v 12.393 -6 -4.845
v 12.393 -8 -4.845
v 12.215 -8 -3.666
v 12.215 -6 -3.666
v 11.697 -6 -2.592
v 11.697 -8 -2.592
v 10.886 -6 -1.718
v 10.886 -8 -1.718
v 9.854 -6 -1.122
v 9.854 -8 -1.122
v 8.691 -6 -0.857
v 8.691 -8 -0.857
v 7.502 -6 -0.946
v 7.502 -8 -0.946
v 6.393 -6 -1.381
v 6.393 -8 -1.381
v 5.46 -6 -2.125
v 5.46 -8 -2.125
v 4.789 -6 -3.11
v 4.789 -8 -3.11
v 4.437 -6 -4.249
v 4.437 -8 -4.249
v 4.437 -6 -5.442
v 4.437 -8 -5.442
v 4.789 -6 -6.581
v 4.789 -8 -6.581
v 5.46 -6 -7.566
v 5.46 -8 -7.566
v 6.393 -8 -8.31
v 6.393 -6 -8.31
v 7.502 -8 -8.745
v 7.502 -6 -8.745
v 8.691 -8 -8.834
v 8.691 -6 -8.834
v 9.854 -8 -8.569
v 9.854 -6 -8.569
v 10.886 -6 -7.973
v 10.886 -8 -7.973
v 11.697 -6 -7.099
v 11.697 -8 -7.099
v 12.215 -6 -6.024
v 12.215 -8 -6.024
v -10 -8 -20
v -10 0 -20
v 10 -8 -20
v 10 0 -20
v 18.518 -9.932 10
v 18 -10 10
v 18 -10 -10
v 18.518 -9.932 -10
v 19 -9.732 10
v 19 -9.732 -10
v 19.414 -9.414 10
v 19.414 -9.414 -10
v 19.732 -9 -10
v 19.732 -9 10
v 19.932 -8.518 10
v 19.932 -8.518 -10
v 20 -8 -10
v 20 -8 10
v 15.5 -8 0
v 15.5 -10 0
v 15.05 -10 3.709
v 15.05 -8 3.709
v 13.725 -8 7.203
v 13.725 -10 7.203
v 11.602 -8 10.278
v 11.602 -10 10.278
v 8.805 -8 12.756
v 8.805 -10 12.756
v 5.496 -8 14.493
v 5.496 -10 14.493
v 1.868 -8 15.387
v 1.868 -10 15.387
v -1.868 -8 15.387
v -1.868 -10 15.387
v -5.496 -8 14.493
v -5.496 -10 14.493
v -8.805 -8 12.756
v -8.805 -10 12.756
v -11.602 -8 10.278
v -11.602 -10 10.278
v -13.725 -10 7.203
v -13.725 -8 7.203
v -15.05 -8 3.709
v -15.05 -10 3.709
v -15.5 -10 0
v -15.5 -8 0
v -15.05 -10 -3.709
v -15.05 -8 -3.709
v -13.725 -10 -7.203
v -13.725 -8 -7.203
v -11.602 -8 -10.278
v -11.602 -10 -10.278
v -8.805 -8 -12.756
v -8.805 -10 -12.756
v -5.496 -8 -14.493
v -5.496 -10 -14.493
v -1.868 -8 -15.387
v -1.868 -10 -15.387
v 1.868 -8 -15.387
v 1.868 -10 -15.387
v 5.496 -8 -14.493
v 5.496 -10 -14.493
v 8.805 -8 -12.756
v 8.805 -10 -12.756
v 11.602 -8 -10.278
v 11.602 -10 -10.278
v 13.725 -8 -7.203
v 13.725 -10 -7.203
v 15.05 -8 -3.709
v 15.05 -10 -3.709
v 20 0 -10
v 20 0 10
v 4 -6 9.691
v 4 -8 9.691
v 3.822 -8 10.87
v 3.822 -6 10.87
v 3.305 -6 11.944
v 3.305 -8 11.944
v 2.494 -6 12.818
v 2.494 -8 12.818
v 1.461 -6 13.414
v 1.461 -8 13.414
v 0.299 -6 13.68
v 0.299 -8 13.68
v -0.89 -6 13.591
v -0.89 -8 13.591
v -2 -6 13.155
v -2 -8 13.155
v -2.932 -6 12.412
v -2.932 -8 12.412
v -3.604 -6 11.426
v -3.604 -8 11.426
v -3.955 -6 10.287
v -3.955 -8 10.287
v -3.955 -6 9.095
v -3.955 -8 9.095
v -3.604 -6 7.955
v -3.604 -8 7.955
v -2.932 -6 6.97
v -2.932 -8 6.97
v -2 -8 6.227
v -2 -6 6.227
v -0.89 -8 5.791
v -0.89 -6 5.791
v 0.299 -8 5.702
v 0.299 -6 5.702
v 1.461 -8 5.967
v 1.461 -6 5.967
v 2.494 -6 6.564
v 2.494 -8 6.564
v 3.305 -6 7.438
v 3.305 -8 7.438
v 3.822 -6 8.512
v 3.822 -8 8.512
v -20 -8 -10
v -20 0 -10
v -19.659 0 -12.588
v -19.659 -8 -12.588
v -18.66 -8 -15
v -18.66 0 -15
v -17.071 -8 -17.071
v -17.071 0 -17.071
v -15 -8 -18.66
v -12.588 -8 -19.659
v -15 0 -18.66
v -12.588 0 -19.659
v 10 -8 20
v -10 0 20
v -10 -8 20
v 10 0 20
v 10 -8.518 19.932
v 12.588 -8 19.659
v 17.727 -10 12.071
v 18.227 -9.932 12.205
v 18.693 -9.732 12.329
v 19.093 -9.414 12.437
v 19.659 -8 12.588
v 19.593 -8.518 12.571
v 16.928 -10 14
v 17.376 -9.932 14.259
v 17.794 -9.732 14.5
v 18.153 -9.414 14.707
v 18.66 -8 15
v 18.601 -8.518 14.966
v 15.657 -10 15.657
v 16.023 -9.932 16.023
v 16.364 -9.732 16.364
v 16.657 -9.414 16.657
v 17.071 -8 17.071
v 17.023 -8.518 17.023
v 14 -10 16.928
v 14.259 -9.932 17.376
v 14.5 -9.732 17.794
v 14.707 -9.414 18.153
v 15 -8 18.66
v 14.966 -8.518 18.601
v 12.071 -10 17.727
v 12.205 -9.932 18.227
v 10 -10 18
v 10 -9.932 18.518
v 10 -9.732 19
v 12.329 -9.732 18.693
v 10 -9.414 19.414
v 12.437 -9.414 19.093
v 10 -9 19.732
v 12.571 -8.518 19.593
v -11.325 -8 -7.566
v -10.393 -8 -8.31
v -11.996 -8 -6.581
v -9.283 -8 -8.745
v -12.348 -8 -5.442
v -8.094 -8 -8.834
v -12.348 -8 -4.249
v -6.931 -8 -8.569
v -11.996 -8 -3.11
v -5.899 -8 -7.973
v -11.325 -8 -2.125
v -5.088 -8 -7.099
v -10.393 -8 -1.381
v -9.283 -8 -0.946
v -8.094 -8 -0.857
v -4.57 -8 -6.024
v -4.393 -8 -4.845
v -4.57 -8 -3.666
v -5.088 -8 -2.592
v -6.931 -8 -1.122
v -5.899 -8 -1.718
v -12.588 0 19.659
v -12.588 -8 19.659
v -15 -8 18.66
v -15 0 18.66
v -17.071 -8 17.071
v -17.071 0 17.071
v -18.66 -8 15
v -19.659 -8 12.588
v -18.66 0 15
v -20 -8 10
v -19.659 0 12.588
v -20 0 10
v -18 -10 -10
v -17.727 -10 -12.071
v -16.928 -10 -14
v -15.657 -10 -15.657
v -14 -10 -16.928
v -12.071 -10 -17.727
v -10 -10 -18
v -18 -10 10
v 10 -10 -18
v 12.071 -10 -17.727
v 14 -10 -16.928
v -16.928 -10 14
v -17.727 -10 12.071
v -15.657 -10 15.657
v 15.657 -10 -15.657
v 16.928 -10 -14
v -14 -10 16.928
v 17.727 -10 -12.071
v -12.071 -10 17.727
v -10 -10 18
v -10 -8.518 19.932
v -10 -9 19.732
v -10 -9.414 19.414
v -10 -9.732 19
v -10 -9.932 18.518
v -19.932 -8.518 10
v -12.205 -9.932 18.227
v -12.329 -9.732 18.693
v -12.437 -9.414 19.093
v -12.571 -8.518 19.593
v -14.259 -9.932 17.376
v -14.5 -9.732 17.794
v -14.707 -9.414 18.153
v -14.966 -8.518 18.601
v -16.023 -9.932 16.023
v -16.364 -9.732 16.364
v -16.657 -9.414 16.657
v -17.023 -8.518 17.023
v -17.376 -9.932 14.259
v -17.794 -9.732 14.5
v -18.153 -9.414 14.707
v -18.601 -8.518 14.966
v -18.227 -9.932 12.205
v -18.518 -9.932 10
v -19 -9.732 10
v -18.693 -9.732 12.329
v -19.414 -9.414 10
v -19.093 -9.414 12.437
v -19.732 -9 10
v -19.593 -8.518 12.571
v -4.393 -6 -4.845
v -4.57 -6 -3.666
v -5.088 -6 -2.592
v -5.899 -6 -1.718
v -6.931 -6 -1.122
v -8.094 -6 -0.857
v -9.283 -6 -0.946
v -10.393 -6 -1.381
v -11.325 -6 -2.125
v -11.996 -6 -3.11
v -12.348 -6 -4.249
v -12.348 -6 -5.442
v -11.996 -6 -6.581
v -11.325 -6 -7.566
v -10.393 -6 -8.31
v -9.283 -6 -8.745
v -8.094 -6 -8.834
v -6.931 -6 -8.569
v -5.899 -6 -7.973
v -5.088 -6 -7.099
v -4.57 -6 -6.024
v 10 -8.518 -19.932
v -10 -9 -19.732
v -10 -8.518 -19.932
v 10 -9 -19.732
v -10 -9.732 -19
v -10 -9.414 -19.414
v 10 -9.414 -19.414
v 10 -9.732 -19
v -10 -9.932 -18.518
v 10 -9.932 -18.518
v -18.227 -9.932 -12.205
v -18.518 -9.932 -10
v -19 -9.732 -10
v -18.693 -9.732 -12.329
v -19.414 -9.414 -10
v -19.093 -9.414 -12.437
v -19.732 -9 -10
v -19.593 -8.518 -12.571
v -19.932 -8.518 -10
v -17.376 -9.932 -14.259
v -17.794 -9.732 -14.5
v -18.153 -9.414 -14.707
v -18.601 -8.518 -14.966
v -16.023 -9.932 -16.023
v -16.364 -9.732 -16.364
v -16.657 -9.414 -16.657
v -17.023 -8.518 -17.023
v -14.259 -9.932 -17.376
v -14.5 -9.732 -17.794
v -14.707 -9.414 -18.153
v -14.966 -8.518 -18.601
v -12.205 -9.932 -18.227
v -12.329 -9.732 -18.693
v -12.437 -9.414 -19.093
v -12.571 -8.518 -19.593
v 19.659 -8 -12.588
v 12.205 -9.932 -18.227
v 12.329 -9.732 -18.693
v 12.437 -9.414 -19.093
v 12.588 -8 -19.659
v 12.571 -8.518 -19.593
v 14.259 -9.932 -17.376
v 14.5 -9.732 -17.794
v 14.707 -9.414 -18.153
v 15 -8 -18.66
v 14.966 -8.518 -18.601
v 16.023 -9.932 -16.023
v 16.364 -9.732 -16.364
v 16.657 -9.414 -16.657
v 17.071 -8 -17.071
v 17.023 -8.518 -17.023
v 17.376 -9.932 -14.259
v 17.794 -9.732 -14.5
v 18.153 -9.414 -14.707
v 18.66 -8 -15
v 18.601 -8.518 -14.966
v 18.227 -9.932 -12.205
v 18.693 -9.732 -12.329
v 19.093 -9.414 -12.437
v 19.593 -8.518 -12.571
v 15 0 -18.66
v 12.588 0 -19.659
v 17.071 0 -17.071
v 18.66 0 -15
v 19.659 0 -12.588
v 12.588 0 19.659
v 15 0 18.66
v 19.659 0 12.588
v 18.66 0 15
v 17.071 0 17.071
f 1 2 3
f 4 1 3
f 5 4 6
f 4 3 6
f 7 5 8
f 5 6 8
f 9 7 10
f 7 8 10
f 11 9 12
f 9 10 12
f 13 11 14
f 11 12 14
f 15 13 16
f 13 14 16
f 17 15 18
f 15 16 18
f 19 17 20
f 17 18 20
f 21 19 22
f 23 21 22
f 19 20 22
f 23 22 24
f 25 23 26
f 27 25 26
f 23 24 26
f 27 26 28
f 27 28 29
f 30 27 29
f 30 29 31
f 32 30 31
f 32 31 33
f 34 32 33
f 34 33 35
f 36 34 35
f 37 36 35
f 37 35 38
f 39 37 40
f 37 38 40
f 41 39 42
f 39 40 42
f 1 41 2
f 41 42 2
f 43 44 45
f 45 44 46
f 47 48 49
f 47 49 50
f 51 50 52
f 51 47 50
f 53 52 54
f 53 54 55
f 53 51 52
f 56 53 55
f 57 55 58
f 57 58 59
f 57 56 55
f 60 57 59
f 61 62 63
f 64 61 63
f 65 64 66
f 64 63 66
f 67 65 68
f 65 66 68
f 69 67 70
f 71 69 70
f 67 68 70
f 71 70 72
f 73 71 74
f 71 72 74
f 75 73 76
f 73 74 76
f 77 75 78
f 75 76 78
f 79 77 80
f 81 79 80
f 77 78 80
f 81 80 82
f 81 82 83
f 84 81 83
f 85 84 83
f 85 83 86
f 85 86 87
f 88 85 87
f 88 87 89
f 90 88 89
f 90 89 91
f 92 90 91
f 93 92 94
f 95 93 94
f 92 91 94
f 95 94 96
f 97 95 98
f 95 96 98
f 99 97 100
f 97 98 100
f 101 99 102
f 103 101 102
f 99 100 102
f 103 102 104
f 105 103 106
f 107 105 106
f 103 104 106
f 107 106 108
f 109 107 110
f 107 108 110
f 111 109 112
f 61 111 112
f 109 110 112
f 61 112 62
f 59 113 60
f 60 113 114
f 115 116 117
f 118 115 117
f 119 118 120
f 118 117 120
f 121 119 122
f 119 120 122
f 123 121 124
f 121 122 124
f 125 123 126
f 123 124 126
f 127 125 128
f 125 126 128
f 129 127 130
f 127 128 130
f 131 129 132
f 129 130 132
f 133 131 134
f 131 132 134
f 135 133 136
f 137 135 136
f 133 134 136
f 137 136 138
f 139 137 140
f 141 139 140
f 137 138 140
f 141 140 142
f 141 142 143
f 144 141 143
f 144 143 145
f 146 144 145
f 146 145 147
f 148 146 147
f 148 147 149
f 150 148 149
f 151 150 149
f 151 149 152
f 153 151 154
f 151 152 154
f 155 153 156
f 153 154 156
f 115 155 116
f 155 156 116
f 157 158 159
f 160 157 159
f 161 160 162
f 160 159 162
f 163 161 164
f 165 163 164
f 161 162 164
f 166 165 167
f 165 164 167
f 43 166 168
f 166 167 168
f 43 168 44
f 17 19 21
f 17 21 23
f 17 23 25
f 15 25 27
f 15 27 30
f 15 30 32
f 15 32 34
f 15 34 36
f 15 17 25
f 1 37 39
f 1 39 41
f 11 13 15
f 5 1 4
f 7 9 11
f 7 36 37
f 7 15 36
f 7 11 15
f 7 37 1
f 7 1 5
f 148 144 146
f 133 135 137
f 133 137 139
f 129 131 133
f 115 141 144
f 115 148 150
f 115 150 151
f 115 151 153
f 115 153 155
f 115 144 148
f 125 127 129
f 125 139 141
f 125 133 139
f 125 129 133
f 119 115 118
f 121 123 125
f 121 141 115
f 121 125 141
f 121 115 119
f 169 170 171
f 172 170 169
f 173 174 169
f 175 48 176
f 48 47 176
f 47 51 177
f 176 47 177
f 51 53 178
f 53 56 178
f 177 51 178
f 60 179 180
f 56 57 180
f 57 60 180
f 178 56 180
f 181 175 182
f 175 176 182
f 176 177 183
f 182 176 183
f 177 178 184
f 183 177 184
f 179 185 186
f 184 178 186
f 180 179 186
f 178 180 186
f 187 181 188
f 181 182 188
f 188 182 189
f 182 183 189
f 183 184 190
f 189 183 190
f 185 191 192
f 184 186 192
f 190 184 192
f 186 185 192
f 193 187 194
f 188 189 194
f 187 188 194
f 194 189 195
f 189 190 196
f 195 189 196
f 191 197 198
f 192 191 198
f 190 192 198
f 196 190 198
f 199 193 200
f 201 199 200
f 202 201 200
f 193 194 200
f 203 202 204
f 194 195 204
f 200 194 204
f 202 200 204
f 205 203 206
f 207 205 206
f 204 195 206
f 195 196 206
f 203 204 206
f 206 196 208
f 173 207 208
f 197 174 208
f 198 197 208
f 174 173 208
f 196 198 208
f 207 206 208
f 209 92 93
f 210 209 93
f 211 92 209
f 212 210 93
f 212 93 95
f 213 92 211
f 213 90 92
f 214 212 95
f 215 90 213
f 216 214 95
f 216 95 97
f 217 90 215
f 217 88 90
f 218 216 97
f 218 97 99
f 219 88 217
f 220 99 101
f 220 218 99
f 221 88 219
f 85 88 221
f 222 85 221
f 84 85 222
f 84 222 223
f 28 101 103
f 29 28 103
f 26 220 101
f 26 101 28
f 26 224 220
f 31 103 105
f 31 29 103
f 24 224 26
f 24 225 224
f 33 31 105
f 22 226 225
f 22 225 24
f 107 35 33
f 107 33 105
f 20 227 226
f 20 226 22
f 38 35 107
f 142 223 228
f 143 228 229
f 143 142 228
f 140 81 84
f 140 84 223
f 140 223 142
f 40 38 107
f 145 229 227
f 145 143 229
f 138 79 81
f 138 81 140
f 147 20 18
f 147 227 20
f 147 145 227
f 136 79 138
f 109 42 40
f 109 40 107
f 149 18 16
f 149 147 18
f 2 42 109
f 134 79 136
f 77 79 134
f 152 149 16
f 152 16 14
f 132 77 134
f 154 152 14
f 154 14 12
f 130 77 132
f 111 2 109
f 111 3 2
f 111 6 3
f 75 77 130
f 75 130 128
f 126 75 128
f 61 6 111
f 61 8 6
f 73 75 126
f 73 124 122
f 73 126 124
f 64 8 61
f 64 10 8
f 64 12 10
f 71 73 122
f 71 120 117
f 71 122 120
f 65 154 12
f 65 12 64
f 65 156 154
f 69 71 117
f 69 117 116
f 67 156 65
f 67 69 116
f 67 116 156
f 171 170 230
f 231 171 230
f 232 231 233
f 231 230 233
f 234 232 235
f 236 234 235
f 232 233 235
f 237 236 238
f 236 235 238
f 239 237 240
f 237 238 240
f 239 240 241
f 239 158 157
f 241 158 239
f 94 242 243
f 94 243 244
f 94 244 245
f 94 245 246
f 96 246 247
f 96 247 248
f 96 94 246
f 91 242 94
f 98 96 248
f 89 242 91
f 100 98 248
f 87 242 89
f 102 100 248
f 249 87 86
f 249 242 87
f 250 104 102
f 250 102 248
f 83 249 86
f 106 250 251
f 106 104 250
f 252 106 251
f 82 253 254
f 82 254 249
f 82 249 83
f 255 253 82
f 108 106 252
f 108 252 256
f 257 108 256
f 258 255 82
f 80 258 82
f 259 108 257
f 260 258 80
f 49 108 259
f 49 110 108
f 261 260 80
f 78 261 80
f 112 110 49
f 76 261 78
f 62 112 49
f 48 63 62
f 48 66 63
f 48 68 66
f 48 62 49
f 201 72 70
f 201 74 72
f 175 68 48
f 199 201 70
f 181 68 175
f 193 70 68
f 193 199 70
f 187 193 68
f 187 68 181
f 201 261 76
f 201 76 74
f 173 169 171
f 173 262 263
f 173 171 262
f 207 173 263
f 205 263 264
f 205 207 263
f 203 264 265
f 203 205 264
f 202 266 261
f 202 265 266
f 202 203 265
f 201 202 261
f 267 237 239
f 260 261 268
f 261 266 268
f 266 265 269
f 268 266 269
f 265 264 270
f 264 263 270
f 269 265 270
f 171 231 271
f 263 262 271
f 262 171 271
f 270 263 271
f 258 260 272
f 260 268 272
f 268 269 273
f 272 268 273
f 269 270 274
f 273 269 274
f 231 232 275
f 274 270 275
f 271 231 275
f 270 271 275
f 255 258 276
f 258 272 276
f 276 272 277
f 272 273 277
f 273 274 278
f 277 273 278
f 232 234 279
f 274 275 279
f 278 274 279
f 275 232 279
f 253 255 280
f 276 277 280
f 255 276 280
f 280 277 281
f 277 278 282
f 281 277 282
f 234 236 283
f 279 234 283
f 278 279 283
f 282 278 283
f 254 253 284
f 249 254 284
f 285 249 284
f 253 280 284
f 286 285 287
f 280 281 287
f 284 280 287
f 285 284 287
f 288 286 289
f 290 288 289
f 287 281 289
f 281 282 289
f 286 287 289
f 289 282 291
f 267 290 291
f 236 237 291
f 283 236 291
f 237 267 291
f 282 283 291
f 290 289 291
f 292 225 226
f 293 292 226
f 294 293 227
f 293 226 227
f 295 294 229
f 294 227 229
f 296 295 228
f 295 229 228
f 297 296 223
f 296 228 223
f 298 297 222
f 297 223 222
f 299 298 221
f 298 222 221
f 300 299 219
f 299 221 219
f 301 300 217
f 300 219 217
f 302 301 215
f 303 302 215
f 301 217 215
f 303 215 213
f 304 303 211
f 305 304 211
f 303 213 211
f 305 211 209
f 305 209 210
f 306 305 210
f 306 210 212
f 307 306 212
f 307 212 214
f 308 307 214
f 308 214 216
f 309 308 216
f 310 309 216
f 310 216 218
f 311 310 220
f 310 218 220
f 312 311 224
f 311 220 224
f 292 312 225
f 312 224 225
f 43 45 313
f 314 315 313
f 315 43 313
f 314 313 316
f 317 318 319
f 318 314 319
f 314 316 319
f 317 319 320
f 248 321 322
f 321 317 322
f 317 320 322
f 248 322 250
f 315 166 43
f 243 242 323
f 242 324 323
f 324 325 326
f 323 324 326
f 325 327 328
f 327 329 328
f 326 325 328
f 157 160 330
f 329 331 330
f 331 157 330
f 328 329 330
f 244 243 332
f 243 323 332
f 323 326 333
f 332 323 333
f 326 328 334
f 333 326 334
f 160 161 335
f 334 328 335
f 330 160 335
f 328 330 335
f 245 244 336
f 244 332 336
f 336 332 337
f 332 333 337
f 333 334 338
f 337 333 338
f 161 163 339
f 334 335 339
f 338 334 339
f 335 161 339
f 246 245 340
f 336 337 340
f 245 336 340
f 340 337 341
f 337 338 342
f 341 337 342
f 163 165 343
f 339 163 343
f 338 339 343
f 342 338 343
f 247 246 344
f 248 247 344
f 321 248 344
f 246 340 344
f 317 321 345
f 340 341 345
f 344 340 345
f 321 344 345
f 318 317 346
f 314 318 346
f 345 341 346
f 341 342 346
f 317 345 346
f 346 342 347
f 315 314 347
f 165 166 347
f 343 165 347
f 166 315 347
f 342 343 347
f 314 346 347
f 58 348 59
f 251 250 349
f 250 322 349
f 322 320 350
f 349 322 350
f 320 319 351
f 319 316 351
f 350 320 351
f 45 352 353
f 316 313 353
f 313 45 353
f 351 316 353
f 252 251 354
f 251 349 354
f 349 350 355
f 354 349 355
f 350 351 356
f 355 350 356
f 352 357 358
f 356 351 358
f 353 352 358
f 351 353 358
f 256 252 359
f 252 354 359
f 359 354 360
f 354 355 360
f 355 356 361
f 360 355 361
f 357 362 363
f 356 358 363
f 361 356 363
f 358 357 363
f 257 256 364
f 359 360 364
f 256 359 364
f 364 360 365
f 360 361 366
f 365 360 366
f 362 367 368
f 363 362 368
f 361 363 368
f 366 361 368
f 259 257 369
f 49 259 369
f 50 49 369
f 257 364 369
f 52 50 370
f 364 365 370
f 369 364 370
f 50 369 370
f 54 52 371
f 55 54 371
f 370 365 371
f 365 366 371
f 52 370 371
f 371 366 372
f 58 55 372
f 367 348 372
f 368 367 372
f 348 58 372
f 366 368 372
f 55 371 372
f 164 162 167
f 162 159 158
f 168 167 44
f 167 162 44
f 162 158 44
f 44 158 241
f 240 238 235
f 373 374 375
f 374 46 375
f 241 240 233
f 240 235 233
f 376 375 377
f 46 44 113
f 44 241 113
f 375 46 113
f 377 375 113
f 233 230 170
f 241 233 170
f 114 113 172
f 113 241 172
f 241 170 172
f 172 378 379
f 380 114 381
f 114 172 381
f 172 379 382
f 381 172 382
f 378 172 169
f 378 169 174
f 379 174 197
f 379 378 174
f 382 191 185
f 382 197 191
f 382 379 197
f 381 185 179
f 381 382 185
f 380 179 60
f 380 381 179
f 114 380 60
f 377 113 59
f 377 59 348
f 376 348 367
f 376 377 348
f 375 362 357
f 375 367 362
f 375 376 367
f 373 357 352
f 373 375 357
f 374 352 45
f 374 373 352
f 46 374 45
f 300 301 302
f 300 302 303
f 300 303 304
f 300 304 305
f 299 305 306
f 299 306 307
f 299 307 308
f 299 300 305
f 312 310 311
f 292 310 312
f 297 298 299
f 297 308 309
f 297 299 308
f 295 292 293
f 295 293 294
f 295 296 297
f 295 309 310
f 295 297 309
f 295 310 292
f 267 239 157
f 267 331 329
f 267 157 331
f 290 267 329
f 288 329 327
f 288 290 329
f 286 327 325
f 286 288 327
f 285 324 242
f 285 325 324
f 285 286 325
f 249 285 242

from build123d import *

# Parameters (mm, degrees)
F0_W         = 40
F0_H         = 40
F1_DEPTH     = 10
F2_R         = 15.5
F3_DEPTH     = 2
F4_R         = 4
F5_DEPTH     = 2
F6_R         = 2
F7_T1_DEPTH  = 35
F7_T4_ANGLE  = 90
F7_T6_ANGLE  = 90
F7_T8_ANGLE  = 90
F7_T10_ANGLE = 90


# Not quite as in the source:
# - a fillet or chamfer that OpenCascade refuses, or shapes differently, is made with other operations: its cross-section is extruded or revolved along the edge and cut away or added


with BuildPart() as f1:
    # F0 (on Front) → F1 (new body)
    with BuildSketch(Plane.XZ):
        Rectangle(F0_W, F0_H)
    extrude(amount=F1_DEPTH)

    # F2 (on face) → F3 (cut)
    with BuildSketch(Plane.XZ.offset(10)):
        Circle(F2_R)
    extrude(amount=-F3_DEPTH, mode=Mode.SUBTRACT)

    # F4 (on face) → F5 (cut)
    with BuildSketch(Plane.XZ.offset(8)):
        with Locations((0, 9.6908602864)):
            Circle(F4_R)
        with Locations((-8.3925311925, -4.8454301432)):
            Circle(F4_R)
        with Locations((8.3925311925, -4.8454301432)):
            Circle(F4_R)
    extrude(amount=-F5_DEPTH, mode=Mode.SUBTRACT)

    # F6
    f6_edges = [f1.edges().sort_by_distance(p)[0] for p in [
        (0, -10, 20),
        (-20, -10, 0),
        (20, -10, 0),
        (0, -10, -20),
    ]]
    fillet(f6_edges, radius=F6_R)

    # F7: fillet of radius 10 on 4 edges, made by hand

    # F7_s2 → F7_t1 (cut)
    with BuildSketch(Plane.XZ.offset(-25)):
        with BuildLine():
            ThreePointArc((10, 20), (17.0710678119, 17.0710678119), (20, 10))
            Line((20, 10), (20, 20))
            Line((20, 20), (10, 20))
        make_face()
        with BuildLine():
            ThreePointArc((-10, 20), (-17.0710678119, 17.0710678119), (-20, 10))
            Line((-20, 10), (-20, 20))
            Line((-20, 20), (-10, 20))
        make_face()
        with BuildLine():
            ThreePointArc((20, -10), (17.0710678119, -17.0710678119), (10, -20))
            Line((10, -20), (20, -20))
            Line((20, -20), (20, -10))
        make_face()
        with BuildLine():
            ThreePointArc((-20, -10), (-17.0710678119, -17.0710678119), (-10, -20))
            Line((-10, -20), (-20, -20))
            Line((-20, -20), (-20, -10))
        make_face()
    extrude(amount=F7_T1_DEPTH, mode=Mode.SUBTRACT)

    # F7_s3 → F7_t4 (revolve, cut)
    with BuildSketch(Plane.XY.offset(-10)):
        with BuildLine():
            ThreePointArc((-18, -10), (-19.4142135624, -9.4142135624), (-20, -8))
            Line((-20, -8), (-20, -10))
            Line((-20, -10), (-18, -10))
        make_face()
    revolve(axis=Axis((-10, -10, -10), (0, -1, 0)), revolution_arc=F7_T4_ANGLE, mode=Mode.SUBTRACT)

    # F7_s5 → F7_t6 (revolve, cut)
    with BuildSketch(Plane.YZ.offset(10)):
        with BuildLine():
            ThreePointArc((-10, -18), (-9.4142135624, -19.4142135624), (-8, -20))
            Line((-8, -20), (-10, -20))
            Line((-10, -20), (-10, -18))
        make_face()
    revolve(axis=Axis((10, -10, -10), (0, -1, 0)), revolution_arc=F7_T6_ANGLE, mode=Mode.SUBTRACT)

    # F7_s7 → F7_t8 (revolve, cut)
    with BuildSketch(Plane.YZ.offset(-10)):
        with BuildLine():
            ThreePointArc((-10, 18), (-9.4142135624, 19.4142135624), (-8, 20))
            Line((-8, 20), (-10, 20))
            Line((-10, 20), (-10, 18))
        make_face()
    revolve(axis=Axis((-10, -10, 10), (0, -1, 0)), revolution_arc=F7_T8_ANGLE, mode=Mode.SUBTRACT)

    # F7_s9 → F7_t10 (revolve, cut)
    with BuildSketch(Plane.XY.offset(10)):
        with BuildLine():
            ThreePointArc((18, -10), (19.4142135624, -9.4142135624), (20, -8))
            Line((20, -8), (20, -10))
            Line((20, -10), (18, -10))
        make_face()
    revolve(axis=Axis((10, -10, 10), (0, -1, 0)), revolution_arc=F7_T10_ANGLE, mode=Mode.SUBTRACT)


solid = f1.part
